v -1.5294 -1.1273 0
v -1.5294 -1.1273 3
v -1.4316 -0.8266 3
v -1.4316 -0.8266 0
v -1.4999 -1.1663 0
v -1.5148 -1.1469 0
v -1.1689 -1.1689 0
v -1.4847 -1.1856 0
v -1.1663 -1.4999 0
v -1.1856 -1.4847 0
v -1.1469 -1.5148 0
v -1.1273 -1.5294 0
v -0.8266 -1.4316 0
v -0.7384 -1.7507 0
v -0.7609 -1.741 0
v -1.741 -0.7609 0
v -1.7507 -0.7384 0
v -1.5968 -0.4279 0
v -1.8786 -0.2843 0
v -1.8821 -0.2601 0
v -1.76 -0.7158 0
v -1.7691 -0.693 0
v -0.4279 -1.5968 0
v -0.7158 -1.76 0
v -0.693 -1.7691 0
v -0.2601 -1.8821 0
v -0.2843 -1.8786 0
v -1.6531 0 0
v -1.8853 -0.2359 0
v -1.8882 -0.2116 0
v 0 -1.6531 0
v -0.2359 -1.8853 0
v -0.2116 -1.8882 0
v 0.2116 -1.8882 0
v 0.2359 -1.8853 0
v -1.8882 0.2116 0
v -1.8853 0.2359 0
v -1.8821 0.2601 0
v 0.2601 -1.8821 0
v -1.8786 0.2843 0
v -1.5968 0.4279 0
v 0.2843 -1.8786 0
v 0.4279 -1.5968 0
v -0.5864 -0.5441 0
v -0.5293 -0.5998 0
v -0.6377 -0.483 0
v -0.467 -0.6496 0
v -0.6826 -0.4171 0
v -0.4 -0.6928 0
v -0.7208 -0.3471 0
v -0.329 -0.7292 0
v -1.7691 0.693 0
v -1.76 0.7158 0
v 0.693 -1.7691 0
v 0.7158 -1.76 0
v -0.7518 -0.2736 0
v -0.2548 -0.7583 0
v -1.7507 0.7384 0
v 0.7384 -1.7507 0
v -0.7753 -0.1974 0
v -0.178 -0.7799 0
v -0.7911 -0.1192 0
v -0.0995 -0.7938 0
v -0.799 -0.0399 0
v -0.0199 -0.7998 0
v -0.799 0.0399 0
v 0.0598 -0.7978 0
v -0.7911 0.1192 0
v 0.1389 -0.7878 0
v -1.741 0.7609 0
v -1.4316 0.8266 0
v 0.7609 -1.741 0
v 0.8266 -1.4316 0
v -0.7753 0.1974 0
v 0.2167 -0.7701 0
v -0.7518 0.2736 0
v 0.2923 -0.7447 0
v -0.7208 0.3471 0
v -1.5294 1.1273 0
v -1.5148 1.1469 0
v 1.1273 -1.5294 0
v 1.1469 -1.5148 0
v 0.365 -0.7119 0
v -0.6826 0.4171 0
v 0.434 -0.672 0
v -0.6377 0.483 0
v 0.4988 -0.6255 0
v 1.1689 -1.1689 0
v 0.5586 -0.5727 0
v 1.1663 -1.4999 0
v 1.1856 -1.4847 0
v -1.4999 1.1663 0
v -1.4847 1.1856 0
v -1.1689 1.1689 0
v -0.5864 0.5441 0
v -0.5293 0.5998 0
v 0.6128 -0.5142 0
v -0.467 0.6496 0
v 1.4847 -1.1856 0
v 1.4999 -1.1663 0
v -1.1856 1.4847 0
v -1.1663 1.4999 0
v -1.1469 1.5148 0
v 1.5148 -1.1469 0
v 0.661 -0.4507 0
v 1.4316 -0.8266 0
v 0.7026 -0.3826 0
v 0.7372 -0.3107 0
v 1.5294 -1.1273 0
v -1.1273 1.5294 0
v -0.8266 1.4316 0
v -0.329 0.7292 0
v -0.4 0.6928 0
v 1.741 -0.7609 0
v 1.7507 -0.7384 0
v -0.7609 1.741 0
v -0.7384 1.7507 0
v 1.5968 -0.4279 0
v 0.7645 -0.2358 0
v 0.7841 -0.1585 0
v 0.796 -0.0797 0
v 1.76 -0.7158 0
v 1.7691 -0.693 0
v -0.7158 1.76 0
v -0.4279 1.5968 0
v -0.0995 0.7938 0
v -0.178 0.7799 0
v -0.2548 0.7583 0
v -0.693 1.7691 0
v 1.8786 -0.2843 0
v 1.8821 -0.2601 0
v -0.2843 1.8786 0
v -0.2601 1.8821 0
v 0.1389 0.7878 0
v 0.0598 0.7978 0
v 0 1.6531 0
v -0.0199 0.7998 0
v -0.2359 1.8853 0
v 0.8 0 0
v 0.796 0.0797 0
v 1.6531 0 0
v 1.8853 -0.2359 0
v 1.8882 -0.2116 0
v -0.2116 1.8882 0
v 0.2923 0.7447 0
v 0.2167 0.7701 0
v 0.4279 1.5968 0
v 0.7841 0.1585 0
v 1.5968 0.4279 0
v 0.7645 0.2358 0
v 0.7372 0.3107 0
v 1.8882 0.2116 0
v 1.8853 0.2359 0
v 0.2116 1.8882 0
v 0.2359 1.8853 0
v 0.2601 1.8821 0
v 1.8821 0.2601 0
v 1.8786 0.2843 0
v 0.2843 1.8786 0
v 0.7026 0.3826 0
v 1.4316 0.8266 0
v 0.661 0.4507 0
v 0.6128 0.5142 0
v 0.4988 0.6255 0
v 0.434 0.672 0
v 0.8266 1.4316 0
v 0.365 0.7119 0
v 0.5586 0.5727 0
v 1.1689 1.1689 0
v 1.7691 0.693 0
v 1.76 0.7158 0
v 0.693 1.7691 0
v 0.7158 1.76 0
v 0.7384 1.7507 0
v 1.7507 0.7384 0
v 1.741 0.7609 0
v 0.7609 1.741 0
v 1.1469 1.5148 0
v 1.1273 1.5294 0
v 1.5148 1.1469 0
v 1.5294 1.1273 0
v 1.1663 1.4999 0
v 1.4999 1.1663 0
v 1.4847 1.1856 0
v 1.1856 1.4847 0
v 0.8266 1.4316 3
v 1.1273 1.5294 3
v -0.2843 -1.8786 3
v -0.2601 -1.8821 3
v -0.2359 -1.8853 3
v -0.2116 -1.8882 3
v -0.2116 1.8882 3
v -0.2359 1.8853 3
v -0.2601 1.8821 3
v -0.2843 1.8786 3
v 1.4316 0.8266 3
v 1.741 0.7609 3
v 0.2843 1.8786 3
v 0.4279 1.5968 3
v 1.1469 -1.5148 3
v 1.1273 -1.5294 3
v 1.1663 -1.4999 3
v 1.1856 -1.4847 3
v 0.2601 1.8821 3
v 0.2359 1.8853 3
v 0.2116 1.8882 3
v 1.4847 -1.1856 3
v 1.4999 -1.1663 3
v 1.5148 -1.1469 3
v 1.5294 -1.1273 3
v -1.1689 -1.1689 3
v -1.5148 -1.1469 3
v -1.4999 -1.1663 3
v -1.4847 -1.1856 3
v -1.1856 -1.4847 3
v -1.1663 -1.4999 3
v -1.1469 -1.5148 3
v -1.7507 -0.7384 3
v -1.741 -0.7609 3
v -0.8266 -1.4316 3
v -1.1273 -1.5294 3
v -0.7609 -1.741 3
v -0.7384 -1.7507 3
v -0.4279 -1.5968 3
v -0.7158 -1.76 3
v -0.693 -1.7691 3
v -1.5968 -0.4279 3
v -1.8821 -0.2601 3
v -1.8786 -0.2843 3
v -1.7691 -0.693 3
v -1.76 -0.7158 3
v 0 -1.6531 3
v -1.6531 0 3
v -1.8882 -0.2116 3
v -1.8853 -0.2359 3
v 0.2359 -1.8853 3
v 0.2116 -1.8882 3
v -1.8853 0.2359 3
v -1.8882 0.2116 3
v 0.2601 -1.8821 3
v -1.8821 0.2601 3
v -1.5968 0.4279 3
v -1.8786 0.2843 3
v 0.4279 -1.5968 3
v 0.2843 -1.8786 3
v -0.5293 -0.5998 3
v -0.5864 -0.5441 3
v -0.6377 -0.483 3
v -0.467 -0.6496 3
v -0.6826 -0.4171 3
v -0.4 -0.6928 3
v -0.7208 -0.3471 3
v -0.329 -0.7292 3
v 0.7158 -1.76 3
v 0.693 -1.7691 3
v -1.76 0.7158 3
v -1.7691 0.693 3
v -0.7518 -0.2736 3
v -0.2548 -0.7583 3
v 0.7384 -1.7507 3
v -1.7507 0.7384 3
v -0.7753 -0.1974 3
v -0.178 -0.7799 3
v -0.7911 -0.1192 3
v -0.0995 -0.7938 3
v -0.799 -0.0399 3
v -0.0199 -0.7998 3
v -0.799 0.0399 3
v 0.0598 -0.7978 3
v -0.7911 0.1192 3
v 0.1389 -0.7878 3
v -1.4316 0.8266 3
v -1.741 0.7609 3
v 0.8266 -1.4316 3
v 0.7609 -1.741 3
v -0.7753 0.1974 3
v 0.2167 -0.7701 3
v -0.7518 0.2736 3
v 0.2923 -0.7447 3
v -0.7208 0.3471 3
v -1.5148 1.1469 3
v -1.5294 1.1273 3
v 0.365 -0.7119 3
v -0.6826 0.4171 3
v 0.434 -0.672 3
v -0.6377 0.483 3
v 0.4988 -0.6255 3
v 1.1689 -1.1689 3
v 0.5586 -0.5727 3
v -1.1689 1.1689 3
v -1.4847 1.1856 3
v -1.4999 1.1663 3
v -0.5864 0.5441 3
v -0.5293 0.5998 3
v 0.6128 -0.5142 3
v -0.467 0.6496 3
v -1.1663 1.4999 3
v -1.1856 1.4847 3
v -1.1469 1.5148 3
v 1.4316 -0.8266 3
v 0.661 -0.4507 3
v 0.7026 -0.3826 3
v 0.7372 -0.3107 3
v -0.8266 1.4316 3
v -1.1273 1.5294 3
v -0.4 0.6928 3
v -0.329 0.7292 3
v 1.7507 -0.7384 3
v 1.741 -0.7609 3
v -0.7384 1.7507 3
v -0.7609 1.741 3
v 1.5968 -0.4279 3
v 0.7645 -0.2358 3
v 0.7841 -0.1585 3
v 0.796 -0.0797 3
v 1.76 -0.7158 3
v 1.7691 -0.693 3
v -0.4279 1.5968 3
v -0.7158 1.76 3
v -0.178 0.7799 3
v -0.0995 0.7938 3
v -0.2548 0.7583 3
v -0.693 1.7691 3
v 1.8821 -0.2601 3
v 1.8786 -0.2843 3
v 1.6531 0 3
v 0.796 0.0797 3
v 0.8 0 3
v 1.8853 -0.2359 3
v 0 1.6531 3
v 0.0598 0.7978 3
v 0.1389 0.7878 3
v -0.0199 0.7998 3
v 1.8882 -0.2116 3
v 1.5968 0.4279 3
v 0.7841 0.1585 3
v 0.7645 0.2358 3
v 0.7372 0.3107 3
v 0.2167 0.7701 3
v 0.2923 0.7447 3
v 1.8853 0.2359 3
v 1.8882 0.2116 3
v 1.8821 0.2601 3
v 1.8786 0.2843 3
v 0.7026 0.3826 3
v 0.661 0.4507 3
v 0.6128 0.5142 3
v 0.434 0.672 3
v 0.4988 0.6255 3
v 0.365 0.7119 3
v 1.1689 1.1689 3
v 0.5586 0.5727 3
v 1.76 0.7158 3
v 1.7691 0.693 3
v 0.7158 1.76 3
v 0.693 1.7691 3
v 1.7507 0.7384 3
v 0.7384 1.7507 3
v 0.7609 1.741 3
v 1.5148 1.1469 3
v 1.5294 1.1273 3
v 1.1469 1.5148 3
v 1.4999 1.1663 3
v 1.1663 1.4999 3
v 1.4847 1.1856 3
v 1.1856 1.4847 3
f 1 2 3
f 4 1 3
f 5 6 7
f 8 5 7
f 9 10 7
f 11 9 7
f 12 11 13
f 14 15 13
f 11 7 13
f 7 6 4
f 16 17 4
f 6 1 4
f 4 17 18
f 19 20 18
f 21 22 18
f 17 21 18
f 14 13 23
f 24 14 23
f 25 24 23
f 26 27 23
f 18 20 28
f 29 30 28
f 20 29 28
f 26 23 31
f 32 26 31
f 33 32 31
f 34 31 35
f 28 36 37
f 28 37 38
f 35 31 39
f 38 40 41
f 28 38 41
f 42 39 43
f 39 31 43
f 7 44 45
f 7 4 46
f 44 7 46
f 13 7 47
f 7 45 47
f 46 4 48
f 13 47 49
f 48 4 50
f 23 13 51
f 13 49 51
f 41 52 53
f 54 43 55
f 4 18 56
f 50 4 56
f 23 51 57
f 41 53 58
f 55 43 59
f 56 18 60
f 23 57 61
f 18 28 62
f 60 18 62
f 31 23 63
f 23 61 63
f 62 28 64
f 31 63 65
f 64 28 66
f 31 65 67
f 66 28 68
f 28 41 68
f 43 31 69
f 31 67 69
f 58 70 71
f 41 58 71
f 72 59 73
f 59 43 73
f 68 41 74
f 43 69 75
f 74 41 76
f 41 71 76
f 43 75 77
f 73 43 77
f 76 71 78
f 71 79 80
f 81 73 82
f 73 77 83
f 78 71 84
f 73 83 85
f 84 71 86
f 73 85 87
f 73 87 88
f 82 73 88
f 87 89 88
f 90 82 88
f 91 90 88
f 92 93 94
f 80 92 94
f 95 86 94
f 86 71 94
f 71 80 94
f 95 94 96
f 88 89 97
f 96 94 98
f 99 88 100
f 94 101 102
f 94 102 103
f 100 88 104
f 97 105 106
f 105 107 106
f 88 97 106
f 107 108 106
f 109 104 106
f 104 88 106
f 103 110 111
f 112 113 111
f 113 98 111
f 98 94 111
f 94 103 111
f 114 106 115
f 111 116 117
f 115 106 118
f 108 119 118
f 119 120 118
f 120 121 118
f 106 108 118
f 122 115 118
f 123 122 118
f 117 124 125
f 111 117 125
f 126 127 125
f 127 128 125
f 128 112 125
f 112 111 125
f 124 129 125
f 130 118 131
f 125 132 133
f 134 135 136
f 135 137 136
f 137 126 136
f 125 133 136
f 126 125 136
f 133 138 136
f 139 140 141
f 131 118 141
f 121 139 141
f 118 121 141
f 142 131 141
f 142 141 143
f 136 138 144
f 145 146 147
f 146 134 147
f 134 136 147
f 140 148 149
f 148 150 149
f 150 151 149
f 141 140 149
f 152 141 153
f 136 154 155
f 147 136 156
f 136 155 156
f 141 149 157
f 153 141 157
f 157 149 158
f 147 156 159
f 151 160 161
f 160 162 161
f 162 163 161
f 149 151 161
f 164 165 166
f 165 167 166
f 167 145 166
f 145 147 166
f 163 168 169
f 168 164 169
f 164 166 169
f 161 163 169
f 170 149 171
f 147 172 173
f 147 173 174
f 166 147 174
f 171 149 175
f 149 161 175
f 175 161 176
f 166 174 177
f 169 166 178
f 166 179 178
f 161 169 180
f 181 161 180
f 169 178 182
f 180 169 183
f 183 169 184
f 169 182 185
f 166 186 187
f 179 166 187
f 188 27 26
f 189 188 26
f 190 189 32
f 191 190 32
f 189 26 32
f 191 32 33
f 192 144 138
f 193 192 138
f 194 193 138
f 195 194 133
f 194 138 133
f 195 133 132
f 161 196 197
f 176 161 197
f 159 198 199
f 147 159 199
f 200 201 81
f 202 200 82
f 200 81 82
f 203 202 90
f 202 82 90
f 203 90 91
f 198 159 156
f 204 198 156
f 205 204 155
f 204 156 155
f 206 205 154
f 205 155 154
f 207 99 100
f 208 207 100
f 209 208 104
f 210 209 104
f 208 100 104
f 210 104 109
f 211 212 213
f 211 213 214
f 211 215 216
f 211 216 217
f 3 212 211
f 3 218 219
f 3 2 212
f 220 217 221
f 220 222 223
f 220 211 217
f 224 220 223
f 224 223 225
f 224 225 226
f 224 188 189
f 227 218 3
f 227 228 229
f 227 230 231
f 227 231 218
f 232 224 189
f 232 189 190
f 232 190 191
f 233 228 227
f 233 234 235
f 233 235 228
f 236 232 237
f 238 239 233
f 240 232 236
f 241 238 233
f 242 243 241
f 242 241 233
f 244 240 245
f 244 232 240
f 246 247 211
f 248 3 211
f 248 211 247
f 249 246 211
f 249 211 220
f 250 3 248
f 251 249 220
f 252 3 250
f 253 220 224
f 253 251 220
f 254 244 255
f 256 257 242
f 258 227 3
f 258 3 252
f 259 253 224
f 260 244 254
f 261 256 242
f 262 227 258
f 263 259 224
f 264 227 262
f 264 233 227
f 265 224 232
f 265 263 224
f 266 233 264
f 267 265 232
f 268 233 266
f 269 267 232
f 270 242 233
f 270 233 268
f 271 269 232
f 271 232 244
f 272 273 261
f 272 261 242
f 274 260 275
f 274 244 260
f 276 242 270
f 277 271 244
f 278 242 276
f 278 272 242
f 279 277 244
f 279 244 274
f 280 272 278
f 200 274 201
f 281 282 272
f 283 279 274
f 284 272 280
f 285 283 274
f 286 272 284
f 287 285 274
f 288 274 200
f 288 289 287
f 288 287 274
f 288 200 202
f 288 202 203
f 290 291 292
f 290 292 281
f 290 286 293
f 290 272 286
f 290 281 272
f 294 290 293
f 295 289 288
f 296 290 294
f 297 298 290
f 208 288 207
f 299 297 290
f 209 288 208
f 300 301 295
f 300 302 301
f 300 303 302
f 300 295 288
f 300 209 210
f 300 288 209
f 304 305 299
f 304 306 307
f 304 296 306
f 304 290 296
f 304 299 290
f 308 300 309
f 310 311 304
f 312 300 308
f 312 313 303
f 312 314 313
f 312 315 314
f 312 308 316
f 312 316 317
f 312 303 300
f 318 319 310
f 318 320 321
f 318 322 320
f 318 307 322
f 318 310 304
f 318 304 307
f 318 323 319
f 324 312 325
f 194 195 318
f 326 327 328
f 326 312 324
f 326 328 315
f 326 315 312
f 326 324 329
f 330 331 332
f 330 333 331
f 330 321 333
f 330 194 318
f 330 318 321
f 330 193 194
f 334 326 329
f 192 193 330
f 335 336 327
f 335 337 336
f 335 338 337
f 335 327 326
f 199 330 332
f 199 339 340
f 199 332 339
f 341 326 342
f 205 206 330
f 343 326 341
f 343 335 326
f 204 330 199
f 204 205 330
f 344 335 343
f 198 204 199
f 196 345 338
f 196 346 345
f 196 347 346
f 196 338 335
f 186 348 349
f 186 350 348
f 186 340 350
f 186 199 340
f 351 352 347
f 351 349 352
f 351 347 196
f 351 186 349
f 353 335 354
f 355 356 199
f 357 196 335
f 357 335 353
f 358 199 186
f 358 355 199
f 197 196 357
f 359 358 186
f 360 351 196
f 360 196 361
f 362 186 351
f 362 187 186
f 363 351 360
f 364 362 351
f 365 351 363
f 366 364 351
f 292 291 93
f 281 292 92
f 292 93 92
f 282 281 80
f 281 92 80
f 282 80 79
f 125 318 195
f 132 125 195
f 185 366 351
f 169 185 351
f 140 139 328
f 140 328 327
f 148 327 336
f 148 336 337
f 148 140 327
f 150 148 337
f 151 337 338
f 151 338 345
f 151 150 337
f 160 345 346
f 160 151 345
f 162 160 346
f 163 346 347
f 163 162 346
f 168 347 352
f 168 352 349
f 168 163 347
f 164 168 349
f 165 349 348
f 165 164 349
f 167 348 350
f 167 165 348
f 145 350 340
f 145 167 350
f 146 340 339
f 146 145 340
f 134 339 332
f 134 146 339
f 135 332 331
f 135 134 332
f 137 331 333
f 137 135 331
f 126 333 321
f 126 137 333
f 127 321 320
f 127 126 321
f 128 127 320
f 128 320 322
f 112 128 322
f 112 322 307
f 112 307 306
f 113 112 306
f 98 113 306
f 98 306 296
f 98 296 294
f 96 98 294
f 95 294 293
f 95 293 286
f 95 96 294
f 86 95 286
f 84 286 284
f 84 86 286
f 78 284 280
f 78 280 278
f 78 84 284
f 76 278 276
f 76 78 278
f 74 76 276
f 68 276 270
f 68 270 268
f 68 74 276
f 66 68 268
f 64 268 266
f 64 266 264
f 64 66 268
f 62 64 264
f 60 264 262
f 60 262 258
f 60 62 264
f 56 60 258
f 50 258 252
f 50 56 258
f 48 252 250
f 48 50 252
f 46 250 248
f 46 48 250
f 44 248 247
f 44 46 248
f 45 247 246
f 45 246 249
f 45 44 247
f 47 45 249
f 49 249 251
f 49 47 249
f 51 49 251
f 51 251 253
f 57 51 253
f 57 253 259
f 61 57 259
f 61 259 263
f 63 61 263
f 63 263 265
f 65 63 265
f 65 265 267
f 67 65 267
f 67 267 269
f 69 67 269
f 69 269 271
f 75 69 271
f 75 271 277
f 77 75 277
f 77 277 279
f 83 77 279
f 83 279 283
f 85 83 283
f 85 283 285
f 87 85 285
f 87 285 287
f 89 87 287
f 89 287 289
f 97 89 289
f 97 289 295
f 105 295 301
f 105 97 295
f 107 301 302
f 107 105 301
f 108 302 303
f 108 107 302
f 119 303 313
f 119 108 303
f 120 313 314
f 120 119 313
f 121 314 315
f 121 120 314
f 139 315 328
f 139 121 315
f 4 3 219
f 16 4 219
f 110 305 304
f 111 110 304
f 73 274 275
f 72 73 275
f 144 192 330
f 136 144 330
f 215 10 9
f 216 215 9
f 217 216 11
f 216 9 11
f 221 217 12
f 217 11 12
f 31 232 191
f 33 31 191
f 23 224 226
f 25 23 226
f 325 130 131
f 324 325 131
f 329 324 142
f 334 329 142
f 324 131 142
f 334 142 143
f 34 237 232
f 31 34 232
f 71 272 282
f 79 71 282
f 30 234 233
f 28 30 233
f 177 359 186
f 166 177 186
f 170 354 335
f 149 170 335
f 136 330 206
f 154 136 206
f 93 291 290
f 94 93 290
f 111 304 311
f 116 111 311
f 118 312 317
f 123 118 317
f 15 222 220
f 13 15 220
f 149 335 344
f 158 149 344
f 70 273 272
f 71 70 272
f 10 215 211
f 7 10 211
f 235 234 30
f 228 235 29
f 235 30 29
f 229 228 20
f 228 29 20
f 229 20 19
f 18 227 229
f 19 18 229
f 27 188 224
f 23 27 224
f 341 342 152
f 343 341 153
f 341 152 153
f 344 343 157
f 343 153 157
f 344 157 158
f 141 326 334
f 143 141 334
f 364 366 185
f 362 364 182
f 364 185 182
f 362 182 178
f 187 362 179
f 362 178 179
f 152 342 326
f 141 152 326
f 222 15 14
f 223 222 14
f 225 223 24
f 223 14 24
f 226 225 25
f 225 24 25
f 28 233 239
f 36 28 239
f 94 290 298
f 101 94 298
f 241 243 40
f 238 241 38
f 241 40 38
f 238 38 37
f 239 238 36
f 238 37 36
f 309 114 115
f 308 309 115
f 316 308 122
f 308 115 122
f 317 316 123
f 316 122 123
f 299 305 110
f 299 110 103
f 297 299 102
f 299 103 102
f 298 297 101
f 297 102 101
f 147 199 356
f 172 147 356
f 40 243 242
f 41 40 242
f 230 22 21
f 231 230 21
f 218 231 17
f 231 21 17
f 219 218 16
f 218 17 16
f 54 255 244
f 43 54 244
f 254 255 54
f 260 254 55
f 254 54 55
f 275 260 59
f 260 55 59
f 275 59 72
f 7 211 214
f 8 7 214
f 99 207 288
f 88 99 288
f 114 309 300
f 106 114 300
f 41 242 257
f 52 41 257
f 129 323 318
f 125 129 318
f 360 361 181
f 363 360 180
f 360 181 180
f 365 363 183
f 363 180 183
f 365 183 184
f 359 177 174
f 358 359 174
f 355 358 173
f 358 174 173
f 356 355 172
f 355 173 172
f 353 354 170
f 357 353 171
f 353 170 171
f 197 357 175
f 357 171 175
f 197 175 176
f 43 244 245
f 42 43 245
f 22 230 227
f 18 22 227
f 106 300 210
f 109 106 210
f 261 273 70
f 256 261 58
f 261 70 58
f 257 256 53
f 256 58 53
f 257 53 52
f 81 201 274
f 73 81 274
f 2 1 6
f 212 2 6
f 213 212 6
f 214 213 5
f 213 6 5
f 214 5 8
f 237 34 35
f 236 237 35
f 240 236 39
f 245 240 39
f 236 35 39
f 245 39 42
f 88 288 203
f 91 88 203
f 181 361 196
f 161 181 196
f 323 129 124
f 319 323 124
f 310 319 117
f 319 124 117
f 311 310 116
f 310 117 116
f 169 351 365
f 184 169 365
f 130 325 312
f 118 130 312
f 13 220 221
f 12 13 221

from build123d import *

# Parameters (mm, degrees)
ESBO_O1_R                = 1.9
ESBO_O1_R_2              = 0.8
RESSALTO_EXTRUS_O1_DEPTH = 3
CORTE_EXTRUS_O2_DEPTH    = 5.027406113


with BuildPart() as part:
    # Esboço1 → Ressalto-extrusão1 (new body)
    with BuildSketch(Plane.XY):
        Circle(ESBO_O1_R)
        Circle(ESBO_O1_R_2, mode=Mode.SUBTRACT)
    extrude(amount=RESSALTO_EXTRUS_O1_DEPTH)

    # Esboço2 → Corte-extrusão2 (cut, through all)
    with BuildSketch(Plane.XY.offset(3)):
        with BuildLine():
            Line((-0.211558753, 1.888185079), (0, 1.653119799))
            Line((0, 1.653119799), (0.211558753, 1.888185079))
            ThreePointArc((0.211558753, 1.888185079), (0, 1.9), (-0.211558753, 1.888185079))
        make_face()
        with BuildLine():
            ThreePointArc((0.693048322, 1.769091299), (0.491756186, 1.83525907), (0.284348196, 1.878602167))
            Line((0.284348196, 1.878602167), (0.427858888, 1.596791107))
            Line((0.427858888, 1.596791107), (0.693048322, 1.769091299))
        make_face()
        with BuildLine():
            Line((-0.427858888, 1.596791107), (-0.284348196, 1.878602167))
            ThreePointArc((-0.284348196, 1.878602167), (-0.491756186, 1.83525907), (-0.693048322, 1.769091299))
            Line((-0.693048322, 1.769091299), (-0.427858888, 1.596791107))
        make_face()
        with BuildLine():
            ThreePointArc((1.127307794, 1.529436869), (0.95, 1.645448267), (0.760877285, 1.740995622))
            Line((0.760877285, 1.740995622), (0.826559899, 1.431643741))
            Line((0.826559899, 1.431643741), (1.127307794, 1.529436869))
        make_face()
        with BuildLine():
            Line((-0.826559899, 1.431643741), (-0.760877285, 1.740995622))
            ThreePointArc((-0.760877285, 1.740995622), (-0.95, 1.645448267), (-1.127307794, 1.529436869))
            Line((-1.127307794, 1.529436869), (-0.826559899, 1.431643741))
        make_face()
        with BuildLine():
            ThreePointArc((1.484743102, 1.185553845), (1.343502884, 1.343502884), (1.185553845, 1.484743102))
            Line((1.185553845, 1.484743102), (1.16893222, 1.16893222))
            Line((1.16893222, 1.16893222), (1.484743102, 1.185553845))
        make_face()
        with BuildLine():
            Line((-1.16893222, 1.16893222), (-1.185553845, 1.484743102))
            ThreePointArc((-1.185553845, 1.484743102), (-1.343502884, 1.343502884), (-1.484743102, 1.185553845))
            Line((-1.484743102, 1.185553845), (-1.16893222, 1.16893222))
        make_face()
        with BuildLine():
            ThreePointArc((1.740995622, 0.760877285), (1.645448267, 0.95), (1.529436869, 1.127307794))
            Line((1.529436869, 1.127307794), (1.431643741, 0.826559899))
            Line((1.431643741, 0.826559899), (1.740995622, 0.760877285))
        make_face()
        with BuildLine():
            Line((-1.431643741, 0.826559899), (-1.529436869, 1.127307794))
            ThreePointArc((-1.529436869, 1.127307794), (-1.645448267, 0.95), (-1.740995622, 0.760877285))
            Line((-1.740995622, 0.760877285), (-1.431643741, 0.826559899))
        make_face()
        with BuildLine():
            ThreePointArc((1.878602167, 0.284348196), (1.83525907, 0.491756186), (1.769091299, 0.693048322))
            Line((1.769091299, 0.693048322), (1.596791107, 0.427858888))
            Line((1.596791107, 0.427858888), (1.878602167, 0.284348196))
        make_face()
        with BuildLine():
            Line((-1.596791107, 0.427858888), (-1.769091299, 0.693048322))
            ThreePointArc((-1.769091299, 0.693048322), (-1.83525907, 0.491756186), (-1.878602167, 0.284348196))
            Line((-1.878602167, 0.284348196), (-1.596791107, 0.427858888))
        make_face()
        with BuildLine():
            ThreePointArc((1.888185079, -0.211558753), (1.9, 0), (1.888185079, 0.211558753))
            Line((1.888185079, 0.211558753), (1.653119799, 0))
            Line((1.653119799, 0), (1.888185079, -0.211558753))
        make_face()
        with BuildLine():
            Line((-1.653119799, 0), (-1.888185079, 0.211558753))
            ThreePointArc((-1.888185079, 0.211558753), (-1.9, 0), (-1.888185079, -0.211558753))
            Line((-1.888185079, -0.211558753), (-1.653119799, 0))
        make_face()
        with BuildLine():
            Line((-1.596791107, -0.427858888), (-1.878602167, -0.284348196))
            ThreePointArc((-1.878602167, -0.284348196), (-1.83525907, -0.491756186), (-1.769091299, -0.693048322))
            Line((-1.769091299, -0.693048322), (-1.596791107, -0.427858888))
        make_face()
        with BuildLine():
            ThreePointArc((1.769091299, -0.693048322), (1.83525907, -0.491756186), (1.878602167, -0.284348196))
            Line((1.878602167, -0.284348196), (1.596791107, -0.427858888))
            Line((1.596791107, -0.427858888), (1.769091299, -0.693048322))
        make_face()
        with BuildLine():
            Line((-1.431643741, -0.826559899), (-1.740995622, -0.760877285))
            ThreePointArc((-1.740995622, -0.760877285), (-1.645448267, -0.95), (-1.529436869, -1.127307794))
            Line((-1.529436869, -1.127307794), (-1.431643741, -0.826559899))
        make_face()
        with BuildLine():
            ThreePointArc((1.529436869, -1.127307794), (1.645448267, -0.95), (1.740995622, -0.760877285))
            Line((1.740995622, -0.760877285), (1.431643741, -0.826559899))
            Line((1.431643741, -0.826559899), (1.529436869, -1.127307794))
        make_face()
        with BuildLine():
            Line((-1.16893222, -1.16893222), (-1.484743102, -1.185553845))
            ThreePointArc((-1.484743102, -1.185553845), (-1.343502884, -1.343502884), (-1.185553845, -1.484743102))
            Line((-1.185553845, -1.484743102), (-1.16893222, -1.16893222))
        make_face()
        with BuildLine():
            ThreePointArc((1.185553845, -1.484743102), (1.343502884, -1.343502884), (1.484743102, -1.185553845))
            Line((1.484743102, -1.185553845), (1.16893222, -1.16893222))
            Line((1.16893222, -1.16893222), (1.185553845, -1.484743102))
        make_face()
        with BuildLine():
            Line((-0.826559899, -1.431643741), (-1.127307794, -1.529436869))
            ThreePointArc((-1.127307794, -1.529436869), (-0.95, -1.645448267), (-0.760877285, -1.740995622))
            Line((-0.760877285, -1.740995622), (-0.826559899, -1.431643741))
        make_face()
        with BuildLine():
            ThreePointArc((0.760877285, -1.740995622), (0.95, -1.645448267), (1.127307794, -1.529436869))
            Line((1.127307794, -1.529436869), (0.826559899, -1.431643741))
            Line((0.826559899, -1.431643741), (0.760877285, -1.740995622))
        make_face()
        with BuildLine():
            Line((-0.427858888, -1.596791107), (-0.693048322, -1.769091299))
            ThreePointArc((-0.693048322, -1.769091299), (-0.491756186, -1.83525907), (-0.284348196, -1.878602167))
            Line((-0.284348196, -1.878602167), (-0.427858888, -1.596791107))
        make_face()
        with BuildLine():
            ThreePointArc((0.284348196, -1.878602167), (0.491756186, -1.83525907), (0.693048322, -1.769091299))
            Line((0.693048322, -1.769091299), (0.427858888, -1.596791107))
            Line((0.427858888, -1.596791107), (0.284348196, -1.878602167))
        make_face()
        with BuildLine():
            Line((0, -1.653119799), (-0.211558753, -1.888185079))
            ThreePointArc((-0.211558753, -1.888185079), (0, -1.9), (0.211558753, -1.888185079))
            Line((0.211558753, -1.888185079), (0, -1.653119799))
        make_face()
    extrude(amount=-CORTE_EXTRUS_O2_DEPTH, mode=Mode.SUBTRACT)


solid = part.part
